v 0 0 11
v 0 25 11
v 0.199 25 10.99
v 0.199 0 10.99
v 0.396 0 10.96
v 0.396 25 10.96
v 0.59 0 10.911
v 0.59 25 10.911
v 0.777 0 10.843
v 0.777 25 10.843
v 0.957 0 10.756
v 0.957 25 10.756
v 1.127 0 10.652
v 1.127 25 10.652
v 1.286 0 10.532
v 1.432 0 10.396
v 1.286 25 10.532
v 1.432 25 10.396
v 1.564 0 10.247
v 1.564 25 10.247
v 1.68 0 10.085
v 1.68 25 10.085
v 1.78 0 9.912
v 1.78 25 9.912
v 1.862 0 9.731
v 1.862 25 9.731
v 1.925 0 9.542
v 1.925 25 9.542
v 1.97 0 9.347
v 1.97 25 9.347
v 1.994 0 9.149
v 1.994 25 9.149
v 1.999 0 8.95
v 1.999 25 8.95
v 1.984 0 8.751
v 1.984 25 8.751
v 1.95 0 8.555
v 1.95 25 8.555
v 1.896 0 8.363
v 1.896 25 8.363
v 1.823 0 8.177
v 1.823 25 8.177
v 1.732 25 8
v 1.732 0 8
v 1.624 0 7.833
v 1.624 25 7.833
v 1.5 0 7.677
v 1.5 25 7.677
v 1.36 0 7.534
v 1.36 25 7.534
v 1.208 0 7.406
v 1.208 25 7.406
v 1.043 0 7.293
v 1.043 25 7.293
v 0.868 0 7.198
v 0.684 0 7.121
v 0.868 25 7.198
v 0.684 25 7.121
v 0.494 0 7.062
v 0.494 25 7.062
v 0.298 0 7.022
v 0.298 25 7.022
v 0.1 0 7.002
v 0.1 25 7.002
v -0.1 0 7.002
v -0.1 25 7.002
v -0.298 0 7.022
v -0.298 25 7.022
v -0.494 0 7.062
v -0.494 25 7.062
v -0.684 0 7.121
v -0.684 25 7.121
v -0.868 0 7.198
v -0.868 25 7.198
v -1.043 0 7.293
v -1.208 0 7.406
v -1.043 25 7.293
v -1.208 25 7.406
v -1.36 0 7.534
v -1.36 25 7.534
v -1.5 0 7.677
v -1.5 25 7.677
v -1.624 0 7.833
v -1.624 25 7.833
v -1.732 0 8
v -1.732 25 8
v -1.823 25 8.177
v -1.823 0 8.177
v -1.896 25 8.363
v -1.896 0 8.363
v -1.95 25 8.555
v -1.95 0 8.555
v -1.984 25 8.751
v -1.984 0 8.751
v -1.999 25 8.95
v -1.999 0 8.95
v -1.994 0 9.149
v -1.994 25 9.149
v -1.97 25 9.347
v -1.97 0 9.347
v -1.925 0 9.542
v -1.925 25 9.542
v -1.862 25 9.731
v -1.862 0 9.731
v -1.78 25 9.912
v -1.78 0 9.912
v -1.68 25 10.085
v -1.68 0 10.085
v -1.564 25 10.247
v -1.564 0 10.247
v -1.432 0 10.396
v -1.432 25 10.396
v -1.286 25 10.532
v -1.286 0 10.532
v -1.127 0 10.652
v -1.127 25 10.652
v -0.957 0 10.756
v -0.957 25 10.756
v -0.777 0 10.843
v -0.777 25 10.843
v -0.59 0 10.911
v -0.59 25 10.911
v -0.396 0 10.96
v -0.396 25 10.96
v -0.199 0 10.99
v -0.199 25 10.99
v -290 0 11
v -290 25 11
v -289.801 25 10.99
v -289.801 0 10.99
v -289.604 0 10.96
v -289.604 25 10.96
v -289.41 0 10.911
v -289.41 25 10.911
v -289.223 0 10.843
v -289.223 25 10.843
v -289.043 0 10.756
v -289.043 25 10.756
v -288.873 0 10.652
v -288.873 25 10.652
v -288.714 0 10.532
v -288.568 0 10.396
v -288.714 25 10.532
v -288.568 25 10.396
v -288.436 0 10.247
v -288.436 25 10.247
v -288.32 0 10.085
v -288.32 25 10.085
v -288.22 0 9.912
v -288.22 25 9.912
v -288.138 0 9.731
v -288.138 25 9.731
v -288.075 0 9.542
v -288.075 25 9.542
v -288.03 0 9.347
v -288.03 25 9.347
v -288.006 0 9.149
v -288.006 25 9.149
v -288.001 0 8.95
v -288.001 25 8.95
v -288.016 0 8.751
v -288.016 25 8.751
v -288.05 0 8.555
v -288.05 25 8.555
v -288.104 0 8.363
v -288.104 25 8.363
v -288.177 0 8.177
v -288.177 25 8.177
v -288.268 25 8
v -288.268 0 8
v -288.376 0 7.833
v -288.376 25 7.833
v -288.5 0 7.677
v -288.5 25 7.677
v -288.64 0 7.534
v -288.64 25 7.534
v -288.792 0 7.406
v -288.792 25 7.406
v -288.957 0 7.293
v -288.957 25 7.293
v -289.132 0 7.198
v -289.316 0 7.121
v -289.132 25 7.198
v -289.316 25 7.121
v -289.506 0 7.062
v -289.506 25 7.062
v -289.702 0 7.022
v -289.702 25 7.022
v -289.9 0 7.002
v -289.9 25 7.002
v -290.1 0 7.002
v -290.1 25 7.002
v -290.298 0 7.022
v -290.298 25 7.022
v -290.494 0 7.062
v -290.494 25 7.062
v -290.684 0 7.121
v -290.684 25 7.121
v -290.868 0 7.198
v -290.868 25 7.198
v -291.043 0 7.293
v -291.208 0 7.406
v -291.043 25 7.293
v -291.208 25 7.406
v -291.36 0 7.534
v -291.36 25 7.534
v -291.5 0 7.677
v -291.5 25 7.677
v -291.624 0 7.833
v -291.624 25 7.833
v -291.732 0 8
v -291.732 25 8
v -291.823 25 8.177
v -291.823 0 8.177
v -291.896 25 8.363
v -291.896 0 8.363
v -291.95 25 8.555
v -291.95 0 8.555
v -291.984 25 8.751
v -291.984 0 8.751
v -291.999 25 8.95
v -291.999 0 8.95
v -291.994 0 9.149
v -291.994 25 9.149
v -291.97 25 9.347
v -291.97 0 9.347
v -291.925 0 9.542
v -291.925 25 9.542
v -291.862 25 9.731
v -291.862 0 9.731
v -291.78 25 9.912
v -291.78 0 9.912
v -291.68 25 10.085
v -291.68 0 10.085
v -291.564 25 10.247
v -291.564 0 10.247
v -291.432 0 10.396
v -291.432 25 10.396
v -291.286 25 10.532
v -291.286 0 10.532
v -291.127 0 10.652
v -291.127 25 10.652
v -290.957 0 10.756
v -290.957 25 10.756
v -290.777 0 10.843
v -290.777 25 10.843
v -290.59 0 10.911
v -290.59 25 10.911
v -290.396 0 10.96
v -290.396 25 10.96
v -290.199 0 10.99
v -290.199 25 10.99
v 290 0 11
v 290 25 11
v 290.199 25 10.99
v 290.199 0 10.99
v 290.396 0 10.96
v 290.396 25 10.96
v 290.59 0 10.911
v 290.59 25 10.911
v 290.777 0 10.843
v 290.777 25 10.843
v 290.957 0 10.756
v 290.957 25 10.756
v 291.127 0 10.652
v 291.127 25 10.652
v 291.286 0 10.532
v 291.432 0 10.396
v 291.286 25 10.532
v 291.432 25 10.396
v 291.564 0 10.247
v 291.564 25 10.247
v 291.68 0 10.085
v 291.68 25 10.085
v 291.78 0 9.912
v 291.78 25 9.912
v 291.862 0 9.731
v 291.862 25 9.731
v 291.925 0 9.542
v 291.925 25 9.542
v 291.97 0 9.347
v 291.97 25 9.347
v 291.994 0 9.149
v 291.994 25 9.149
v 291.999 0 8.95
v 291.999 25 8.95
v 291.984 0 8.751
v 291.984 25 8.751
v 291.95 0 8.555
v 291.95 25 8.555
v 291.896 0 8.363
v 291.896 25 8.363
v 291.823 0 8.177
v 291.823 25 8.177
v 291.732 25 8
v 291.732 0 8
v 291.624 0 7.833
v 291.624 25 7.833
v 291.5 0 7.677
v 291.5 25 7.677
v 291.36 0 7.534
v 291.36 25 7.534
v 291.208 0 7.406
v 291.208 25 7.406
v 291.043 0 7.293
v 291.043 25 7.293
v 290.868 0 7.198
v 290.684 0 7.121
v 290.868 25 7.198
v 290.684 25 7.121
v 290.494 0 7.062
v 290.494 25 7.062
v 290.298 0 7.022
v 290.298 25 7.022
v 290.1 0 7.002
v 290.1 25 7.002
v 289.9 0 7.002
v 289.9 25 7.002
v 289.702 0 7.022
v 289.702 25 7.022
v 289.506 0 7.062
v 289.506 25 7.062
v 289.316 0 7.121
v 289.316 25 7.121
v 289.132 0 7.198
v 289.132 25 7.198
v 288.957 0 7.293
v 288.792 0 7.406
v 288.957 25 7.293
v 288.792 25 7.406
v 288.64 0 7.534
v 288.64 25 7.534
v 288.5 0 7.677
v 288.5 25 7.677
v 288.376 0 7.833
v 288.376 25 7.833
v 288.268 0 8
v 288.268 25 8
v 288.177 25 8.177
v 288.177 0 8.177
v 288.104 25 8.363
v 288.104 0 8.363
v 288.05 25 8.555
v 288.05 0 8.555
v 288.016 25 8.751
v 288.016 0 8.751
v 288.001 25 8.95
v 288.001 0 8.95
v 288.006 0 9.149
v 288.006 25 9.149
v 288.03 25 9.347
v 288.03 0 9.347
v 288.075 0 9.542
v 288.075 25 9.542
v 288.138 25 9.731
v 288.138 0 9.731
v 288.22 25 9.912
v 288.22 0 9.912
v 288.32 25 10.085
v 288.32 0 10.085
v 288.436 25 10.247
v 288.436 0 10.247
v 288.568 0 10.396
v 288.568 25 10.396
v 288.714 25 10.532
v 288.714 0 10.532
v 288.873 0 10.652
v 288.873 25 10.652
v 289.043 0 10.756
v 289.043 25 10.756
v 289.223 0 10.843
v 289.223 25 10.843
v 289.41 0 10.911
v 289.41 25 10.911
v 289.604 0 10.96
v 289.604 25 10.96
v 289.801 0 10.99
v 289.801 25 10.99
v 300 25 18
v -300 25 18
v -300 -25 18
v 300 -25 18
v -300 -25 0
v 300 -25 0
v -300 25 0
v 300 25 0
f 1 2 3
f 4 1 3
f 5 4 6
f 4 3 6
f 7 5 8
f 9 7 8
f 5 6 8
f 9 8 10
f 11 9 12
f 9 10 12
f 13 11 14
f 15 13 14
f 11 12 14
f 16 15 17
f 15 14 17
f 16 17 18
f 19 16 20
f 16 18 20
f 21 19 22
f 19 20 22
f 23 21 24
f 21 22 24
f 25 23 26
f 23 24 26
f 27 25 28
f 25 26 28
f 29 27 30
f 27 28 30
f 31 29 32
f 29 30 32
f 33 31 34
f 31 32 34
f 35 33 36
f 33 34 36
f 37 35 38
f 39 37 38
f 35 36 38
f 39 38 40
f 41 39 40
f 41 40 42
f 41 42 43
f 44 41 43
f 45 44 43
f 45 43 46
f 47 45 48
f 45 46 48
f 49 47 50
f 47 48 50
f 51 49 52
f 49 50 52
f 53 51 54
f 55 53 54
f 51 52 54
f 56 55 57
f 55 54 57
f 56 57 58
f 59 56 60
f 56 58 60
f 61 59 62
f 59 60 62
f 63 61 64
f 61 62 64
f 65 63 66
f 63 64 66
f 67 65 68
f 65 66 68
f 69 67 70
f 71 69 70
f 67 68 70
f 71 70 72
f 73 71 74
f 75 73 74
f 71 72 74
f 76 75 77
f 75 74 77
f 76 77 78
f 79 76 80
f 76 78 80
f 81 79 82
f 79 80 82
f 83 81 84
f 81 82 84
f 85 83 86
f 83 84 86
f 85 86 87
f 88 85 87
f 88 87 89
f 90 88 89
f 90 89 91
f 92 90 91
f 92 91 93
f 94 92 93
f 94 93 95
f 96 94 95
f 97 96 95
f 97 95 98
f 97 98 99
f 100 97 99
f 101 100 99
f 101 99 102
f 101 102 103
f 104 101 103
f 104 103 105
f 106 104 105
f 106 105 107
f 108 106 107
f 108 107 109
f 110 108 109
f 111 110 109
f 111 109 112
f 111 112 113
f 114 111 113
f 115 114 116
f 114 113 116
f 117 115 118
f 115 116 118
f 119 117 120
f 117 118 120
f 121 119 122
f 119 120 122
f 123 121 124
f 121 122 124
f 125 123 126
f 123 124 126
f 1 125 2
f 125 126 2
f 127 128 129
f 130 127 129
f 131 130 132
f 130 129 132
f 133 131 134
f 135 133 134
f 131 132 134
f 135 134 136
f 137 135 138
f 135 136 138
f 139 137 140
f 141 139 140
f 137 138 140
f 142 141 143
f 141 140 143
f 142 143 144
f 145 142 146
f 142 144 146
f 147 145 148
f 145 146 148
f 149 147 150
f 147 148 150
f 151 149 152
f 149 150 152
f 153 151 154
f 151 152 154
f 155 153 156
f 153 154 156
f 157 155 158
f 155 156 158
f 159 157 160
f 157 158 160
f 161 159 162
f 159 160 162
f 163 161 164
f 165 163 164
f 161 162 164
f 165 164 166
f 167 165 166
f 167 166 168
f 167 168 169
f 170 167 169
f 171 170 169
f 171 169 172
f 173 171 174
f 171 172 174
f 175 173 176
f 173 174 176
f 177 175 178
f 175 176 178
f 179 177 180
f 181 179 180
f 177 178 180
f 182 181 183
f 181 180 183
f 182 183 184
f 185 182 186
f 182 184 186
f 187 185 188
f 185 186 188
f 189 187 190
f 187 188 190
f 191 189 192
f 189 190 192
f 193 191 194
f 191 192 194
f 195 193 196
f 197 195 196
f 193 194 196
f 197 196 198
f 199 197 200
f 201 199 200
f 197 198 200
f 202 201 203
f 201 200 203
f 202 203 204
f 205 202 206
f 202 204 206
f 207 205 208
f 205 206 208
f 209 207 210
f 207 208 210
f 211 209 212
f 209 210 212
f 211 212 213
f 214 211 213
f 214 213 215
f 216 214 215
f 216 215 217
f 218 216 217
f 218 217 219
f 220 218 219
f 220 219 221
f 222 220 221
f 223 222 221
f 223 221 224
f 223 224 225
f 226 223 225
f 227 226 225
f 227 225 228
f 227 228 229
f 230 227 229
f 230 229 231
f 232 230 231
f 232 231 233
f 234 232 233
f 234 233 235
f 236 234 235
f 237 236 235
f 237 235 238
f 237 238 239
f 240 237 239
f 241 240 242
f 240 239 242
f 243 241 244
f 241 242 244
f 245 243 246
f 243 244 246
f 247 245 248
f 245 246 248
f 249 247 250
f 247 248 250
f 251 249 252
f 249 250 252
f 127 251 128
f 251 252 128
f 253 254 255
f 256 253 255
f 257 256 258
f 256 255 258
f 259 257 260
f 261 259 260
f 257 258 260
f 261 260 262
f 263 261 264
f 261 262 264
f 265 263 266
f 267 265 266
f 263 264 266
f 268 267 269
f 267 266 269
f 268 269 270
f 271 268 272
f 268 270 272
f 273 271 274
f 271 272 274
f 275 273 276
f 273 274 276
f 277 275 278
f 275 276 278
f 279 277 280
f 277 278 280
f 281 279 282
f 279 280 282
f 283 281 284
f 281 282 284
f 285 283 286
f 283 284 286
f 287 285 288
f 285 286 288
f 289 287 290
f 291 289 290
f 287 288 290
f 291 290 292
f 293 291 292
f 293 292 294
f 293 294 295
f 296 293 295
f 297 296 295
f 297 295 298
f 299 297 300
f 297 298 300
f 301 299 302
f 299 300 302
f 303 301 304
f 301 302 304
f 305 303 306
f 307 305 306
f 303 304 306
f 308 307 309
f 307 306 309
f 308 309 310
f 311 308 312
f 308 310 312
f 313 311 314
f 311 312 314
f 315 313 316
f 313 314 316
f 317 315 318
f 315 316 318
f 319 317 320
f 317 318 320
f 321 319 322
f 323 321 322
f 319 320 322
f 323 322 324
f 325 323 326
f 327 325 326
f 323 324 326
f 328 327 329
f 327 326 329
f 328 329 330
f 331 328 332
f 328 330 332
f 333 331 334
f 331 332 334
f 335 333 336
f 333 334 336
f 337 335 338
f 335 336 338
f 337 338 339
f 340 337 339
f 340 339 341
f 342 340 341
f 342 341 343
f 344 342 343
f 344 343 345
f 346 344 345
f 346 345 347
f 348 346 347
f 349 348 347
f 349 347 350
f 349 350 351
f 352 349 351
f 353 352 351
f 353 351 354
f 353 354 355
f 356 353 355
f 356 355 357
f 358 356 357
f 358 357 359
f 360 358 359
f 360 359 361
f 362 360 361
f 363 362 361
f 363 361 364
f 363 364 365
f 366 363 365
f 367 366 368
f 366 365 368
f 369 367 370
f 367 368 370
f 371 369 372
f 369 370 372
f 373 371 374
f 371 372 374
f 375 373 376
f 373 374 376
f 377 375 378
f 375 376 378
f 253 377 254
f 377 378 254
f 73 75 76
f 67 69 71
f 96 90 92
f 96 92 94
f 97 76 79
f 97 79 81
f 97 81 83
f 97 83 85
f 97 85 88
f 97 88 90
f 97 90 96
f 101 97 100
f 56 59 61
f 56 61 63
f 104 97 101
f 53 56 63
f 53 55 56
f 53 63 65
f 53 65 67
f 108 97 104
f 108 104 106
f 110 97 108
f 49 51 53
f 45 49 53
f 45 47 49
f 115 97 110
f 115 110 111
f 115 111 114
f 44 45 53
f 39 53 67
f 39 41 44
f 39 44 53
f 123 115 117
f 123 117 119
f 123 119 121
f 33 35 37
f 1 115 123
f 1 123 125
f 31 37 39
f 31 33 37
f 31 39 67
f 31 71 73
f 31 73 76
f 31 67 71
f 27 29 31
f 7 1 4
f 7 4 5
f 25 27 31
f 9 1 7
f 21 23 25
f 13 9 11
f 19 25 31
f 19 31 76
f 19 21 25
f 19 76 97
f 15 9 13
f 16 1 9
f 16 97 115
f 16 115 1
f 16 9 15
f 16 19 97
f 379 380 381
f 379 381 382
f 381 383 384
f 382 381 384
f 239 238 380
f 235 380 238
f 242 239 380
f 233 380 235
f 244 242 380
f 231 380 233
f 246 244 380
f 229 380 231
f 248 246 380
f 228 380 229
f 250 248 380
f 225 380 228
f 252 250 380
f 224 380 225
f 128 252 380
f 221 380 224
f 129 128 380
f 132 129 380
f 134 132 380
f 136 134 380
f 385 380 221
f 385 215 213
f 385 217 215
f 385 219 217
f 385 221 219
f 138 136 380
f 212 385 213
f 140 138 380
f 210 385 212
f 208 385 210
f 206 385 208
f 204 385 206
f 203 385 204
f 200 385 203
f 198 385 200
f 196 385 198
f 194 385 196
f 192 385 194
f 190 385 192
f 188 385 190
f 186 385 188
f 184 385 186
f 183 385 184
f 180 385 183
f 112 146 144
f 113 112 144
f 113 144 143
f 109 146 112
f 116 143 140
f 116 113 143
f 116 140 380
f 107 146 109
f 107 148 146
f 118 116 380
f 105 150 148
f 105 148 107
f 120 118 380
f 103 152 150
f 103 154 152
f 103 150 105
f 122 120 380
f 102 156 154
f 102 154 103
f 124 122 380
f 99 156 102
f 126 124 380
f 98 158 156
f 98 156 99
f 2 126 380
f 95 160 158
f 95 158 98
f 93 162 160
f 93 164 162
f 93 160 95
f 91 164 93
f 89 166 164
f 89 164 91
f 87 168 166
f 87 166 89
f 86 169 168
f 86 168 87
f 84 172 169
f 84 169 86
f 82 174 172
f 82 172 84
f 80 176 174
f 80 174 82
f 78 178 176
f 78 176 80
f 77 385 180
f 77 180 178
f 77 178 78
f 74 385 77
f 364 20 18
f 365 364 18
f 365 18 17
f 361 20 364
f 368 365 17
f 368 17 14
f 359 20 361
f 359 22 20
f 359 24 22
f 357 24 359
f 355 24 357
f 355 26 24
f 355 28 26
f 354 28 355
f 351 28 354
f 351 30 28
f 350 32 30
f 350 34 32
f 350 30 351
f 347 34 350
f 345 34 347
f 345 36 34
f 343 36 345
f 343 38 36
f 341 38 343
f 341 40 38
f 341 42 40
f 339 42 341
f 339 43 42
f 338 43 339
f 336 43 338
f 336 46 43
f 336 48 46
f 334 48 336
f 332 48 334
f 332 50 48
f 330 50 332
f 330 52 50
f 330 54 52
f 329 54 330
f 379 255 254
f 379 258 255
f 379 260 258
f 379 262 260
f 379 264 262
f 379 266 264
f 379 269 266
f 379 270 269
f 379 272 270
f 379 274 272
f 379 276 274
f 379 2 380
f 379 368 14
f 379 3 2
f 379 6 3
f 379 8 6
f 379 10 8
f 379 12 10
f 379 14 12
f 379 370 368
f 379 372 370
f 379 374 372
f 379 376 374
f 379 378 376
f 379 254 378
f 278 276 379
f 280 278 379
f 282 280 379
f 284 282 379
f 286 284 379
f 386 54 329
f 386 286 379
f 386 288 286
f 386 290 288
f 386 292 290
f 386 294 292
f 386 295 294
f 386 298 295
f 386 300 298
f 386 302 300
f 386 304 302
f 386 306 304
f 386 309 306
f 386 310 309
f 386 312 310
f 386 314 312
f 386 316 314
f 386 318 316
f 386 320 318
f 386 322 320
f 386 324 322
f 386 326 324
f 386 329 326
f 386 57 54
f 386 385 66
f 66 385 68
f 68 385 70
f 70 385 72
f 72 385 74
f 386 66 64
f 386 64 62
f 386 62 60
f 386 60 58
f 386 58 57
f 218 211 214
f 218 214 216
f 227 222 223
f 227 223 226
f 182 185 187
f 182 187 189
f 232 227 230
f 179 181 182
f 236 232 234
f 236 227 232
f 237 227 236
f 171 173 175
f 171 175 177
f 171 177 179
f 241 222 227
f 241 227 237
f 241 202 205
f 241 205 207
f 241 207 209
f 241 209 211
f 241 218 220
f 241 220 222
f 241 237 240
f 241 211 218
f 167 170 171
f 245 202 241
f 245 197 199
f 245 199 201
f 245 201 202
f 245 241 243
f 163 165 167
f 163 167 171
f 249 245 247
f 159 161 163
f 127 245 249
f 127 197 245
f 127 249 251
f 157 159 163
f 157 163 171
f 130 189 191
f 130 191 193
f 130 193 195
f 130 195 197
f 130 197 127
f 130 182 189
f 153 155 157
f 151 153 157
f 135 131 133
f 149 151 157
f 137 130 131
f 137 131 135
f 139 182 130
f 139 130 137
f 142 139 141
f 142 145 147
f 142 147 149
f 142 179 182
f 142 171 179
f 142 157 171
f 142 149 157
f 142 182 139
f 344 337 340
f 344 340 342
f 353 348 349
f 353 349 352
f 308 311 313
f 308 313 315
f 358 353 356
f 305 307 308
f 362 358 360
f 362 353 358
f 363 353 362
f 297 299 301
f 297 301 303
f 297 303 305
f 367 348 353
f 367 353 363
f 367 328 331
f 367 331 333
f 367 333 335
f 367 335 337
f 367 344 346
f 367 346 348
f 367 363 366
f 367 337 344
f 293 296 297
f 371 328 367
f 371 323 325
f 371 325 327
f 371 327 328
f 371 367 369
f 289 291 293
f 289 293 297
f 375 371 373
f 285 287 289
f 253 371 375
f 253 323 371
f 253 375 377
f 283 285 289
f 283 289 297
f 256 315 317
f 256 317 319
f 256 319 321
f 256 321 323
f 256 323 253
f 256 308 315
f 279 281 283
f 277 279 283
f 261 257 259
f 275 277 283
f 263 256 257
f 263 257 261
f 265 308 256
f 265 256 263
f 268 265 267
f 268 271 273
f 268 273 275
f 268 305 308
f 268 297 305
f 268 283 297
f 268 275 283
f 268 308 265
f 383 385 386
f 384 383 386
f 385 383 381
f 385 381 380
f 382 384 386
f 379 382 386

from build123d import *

# Parameters (mm, degrees)
SKETCH1_W           = 600
SKETCH1_H           = 50
BOSS_EXTRUDE1_DEPTH = 18
SKETCH2_R           = 2
CUT_EXTRUDE1_DEPTH  = 25


with BuildPart() as part:
    # Sketch1 → Boss-Extrude1 (new body)
    with BuildSketch(Plane.XY):
        Rectangle(SKETCH1_W, SKETCH1_H)
    extrude(amount=BOSS_EXTRUDE1_DEPTH)

    # Sketch2 → Cut-Extrude1 (cut)
    with BuildSketch(Plane(origin=(0, 25, 0), x_dir=(1, 0, 0), z_dir=(0, 1, 0))):
        with Locations(Location((-290, -9, 0), (0, 0, 270))):
            Circle(SKETCH2_R)
        with Locations(Location((0, -9, 0), (0, 0, 270))):
            Circle(SKETCH2_R)
        with Locations(Location((290, -9, 0), (0, 0, 270))):
            Circle(SKETCH2_R)
    extrude(amount=-CUT_EXTRUDE1_DEPTH, mode=Mode.SUBTRACT)


solid = part.part
